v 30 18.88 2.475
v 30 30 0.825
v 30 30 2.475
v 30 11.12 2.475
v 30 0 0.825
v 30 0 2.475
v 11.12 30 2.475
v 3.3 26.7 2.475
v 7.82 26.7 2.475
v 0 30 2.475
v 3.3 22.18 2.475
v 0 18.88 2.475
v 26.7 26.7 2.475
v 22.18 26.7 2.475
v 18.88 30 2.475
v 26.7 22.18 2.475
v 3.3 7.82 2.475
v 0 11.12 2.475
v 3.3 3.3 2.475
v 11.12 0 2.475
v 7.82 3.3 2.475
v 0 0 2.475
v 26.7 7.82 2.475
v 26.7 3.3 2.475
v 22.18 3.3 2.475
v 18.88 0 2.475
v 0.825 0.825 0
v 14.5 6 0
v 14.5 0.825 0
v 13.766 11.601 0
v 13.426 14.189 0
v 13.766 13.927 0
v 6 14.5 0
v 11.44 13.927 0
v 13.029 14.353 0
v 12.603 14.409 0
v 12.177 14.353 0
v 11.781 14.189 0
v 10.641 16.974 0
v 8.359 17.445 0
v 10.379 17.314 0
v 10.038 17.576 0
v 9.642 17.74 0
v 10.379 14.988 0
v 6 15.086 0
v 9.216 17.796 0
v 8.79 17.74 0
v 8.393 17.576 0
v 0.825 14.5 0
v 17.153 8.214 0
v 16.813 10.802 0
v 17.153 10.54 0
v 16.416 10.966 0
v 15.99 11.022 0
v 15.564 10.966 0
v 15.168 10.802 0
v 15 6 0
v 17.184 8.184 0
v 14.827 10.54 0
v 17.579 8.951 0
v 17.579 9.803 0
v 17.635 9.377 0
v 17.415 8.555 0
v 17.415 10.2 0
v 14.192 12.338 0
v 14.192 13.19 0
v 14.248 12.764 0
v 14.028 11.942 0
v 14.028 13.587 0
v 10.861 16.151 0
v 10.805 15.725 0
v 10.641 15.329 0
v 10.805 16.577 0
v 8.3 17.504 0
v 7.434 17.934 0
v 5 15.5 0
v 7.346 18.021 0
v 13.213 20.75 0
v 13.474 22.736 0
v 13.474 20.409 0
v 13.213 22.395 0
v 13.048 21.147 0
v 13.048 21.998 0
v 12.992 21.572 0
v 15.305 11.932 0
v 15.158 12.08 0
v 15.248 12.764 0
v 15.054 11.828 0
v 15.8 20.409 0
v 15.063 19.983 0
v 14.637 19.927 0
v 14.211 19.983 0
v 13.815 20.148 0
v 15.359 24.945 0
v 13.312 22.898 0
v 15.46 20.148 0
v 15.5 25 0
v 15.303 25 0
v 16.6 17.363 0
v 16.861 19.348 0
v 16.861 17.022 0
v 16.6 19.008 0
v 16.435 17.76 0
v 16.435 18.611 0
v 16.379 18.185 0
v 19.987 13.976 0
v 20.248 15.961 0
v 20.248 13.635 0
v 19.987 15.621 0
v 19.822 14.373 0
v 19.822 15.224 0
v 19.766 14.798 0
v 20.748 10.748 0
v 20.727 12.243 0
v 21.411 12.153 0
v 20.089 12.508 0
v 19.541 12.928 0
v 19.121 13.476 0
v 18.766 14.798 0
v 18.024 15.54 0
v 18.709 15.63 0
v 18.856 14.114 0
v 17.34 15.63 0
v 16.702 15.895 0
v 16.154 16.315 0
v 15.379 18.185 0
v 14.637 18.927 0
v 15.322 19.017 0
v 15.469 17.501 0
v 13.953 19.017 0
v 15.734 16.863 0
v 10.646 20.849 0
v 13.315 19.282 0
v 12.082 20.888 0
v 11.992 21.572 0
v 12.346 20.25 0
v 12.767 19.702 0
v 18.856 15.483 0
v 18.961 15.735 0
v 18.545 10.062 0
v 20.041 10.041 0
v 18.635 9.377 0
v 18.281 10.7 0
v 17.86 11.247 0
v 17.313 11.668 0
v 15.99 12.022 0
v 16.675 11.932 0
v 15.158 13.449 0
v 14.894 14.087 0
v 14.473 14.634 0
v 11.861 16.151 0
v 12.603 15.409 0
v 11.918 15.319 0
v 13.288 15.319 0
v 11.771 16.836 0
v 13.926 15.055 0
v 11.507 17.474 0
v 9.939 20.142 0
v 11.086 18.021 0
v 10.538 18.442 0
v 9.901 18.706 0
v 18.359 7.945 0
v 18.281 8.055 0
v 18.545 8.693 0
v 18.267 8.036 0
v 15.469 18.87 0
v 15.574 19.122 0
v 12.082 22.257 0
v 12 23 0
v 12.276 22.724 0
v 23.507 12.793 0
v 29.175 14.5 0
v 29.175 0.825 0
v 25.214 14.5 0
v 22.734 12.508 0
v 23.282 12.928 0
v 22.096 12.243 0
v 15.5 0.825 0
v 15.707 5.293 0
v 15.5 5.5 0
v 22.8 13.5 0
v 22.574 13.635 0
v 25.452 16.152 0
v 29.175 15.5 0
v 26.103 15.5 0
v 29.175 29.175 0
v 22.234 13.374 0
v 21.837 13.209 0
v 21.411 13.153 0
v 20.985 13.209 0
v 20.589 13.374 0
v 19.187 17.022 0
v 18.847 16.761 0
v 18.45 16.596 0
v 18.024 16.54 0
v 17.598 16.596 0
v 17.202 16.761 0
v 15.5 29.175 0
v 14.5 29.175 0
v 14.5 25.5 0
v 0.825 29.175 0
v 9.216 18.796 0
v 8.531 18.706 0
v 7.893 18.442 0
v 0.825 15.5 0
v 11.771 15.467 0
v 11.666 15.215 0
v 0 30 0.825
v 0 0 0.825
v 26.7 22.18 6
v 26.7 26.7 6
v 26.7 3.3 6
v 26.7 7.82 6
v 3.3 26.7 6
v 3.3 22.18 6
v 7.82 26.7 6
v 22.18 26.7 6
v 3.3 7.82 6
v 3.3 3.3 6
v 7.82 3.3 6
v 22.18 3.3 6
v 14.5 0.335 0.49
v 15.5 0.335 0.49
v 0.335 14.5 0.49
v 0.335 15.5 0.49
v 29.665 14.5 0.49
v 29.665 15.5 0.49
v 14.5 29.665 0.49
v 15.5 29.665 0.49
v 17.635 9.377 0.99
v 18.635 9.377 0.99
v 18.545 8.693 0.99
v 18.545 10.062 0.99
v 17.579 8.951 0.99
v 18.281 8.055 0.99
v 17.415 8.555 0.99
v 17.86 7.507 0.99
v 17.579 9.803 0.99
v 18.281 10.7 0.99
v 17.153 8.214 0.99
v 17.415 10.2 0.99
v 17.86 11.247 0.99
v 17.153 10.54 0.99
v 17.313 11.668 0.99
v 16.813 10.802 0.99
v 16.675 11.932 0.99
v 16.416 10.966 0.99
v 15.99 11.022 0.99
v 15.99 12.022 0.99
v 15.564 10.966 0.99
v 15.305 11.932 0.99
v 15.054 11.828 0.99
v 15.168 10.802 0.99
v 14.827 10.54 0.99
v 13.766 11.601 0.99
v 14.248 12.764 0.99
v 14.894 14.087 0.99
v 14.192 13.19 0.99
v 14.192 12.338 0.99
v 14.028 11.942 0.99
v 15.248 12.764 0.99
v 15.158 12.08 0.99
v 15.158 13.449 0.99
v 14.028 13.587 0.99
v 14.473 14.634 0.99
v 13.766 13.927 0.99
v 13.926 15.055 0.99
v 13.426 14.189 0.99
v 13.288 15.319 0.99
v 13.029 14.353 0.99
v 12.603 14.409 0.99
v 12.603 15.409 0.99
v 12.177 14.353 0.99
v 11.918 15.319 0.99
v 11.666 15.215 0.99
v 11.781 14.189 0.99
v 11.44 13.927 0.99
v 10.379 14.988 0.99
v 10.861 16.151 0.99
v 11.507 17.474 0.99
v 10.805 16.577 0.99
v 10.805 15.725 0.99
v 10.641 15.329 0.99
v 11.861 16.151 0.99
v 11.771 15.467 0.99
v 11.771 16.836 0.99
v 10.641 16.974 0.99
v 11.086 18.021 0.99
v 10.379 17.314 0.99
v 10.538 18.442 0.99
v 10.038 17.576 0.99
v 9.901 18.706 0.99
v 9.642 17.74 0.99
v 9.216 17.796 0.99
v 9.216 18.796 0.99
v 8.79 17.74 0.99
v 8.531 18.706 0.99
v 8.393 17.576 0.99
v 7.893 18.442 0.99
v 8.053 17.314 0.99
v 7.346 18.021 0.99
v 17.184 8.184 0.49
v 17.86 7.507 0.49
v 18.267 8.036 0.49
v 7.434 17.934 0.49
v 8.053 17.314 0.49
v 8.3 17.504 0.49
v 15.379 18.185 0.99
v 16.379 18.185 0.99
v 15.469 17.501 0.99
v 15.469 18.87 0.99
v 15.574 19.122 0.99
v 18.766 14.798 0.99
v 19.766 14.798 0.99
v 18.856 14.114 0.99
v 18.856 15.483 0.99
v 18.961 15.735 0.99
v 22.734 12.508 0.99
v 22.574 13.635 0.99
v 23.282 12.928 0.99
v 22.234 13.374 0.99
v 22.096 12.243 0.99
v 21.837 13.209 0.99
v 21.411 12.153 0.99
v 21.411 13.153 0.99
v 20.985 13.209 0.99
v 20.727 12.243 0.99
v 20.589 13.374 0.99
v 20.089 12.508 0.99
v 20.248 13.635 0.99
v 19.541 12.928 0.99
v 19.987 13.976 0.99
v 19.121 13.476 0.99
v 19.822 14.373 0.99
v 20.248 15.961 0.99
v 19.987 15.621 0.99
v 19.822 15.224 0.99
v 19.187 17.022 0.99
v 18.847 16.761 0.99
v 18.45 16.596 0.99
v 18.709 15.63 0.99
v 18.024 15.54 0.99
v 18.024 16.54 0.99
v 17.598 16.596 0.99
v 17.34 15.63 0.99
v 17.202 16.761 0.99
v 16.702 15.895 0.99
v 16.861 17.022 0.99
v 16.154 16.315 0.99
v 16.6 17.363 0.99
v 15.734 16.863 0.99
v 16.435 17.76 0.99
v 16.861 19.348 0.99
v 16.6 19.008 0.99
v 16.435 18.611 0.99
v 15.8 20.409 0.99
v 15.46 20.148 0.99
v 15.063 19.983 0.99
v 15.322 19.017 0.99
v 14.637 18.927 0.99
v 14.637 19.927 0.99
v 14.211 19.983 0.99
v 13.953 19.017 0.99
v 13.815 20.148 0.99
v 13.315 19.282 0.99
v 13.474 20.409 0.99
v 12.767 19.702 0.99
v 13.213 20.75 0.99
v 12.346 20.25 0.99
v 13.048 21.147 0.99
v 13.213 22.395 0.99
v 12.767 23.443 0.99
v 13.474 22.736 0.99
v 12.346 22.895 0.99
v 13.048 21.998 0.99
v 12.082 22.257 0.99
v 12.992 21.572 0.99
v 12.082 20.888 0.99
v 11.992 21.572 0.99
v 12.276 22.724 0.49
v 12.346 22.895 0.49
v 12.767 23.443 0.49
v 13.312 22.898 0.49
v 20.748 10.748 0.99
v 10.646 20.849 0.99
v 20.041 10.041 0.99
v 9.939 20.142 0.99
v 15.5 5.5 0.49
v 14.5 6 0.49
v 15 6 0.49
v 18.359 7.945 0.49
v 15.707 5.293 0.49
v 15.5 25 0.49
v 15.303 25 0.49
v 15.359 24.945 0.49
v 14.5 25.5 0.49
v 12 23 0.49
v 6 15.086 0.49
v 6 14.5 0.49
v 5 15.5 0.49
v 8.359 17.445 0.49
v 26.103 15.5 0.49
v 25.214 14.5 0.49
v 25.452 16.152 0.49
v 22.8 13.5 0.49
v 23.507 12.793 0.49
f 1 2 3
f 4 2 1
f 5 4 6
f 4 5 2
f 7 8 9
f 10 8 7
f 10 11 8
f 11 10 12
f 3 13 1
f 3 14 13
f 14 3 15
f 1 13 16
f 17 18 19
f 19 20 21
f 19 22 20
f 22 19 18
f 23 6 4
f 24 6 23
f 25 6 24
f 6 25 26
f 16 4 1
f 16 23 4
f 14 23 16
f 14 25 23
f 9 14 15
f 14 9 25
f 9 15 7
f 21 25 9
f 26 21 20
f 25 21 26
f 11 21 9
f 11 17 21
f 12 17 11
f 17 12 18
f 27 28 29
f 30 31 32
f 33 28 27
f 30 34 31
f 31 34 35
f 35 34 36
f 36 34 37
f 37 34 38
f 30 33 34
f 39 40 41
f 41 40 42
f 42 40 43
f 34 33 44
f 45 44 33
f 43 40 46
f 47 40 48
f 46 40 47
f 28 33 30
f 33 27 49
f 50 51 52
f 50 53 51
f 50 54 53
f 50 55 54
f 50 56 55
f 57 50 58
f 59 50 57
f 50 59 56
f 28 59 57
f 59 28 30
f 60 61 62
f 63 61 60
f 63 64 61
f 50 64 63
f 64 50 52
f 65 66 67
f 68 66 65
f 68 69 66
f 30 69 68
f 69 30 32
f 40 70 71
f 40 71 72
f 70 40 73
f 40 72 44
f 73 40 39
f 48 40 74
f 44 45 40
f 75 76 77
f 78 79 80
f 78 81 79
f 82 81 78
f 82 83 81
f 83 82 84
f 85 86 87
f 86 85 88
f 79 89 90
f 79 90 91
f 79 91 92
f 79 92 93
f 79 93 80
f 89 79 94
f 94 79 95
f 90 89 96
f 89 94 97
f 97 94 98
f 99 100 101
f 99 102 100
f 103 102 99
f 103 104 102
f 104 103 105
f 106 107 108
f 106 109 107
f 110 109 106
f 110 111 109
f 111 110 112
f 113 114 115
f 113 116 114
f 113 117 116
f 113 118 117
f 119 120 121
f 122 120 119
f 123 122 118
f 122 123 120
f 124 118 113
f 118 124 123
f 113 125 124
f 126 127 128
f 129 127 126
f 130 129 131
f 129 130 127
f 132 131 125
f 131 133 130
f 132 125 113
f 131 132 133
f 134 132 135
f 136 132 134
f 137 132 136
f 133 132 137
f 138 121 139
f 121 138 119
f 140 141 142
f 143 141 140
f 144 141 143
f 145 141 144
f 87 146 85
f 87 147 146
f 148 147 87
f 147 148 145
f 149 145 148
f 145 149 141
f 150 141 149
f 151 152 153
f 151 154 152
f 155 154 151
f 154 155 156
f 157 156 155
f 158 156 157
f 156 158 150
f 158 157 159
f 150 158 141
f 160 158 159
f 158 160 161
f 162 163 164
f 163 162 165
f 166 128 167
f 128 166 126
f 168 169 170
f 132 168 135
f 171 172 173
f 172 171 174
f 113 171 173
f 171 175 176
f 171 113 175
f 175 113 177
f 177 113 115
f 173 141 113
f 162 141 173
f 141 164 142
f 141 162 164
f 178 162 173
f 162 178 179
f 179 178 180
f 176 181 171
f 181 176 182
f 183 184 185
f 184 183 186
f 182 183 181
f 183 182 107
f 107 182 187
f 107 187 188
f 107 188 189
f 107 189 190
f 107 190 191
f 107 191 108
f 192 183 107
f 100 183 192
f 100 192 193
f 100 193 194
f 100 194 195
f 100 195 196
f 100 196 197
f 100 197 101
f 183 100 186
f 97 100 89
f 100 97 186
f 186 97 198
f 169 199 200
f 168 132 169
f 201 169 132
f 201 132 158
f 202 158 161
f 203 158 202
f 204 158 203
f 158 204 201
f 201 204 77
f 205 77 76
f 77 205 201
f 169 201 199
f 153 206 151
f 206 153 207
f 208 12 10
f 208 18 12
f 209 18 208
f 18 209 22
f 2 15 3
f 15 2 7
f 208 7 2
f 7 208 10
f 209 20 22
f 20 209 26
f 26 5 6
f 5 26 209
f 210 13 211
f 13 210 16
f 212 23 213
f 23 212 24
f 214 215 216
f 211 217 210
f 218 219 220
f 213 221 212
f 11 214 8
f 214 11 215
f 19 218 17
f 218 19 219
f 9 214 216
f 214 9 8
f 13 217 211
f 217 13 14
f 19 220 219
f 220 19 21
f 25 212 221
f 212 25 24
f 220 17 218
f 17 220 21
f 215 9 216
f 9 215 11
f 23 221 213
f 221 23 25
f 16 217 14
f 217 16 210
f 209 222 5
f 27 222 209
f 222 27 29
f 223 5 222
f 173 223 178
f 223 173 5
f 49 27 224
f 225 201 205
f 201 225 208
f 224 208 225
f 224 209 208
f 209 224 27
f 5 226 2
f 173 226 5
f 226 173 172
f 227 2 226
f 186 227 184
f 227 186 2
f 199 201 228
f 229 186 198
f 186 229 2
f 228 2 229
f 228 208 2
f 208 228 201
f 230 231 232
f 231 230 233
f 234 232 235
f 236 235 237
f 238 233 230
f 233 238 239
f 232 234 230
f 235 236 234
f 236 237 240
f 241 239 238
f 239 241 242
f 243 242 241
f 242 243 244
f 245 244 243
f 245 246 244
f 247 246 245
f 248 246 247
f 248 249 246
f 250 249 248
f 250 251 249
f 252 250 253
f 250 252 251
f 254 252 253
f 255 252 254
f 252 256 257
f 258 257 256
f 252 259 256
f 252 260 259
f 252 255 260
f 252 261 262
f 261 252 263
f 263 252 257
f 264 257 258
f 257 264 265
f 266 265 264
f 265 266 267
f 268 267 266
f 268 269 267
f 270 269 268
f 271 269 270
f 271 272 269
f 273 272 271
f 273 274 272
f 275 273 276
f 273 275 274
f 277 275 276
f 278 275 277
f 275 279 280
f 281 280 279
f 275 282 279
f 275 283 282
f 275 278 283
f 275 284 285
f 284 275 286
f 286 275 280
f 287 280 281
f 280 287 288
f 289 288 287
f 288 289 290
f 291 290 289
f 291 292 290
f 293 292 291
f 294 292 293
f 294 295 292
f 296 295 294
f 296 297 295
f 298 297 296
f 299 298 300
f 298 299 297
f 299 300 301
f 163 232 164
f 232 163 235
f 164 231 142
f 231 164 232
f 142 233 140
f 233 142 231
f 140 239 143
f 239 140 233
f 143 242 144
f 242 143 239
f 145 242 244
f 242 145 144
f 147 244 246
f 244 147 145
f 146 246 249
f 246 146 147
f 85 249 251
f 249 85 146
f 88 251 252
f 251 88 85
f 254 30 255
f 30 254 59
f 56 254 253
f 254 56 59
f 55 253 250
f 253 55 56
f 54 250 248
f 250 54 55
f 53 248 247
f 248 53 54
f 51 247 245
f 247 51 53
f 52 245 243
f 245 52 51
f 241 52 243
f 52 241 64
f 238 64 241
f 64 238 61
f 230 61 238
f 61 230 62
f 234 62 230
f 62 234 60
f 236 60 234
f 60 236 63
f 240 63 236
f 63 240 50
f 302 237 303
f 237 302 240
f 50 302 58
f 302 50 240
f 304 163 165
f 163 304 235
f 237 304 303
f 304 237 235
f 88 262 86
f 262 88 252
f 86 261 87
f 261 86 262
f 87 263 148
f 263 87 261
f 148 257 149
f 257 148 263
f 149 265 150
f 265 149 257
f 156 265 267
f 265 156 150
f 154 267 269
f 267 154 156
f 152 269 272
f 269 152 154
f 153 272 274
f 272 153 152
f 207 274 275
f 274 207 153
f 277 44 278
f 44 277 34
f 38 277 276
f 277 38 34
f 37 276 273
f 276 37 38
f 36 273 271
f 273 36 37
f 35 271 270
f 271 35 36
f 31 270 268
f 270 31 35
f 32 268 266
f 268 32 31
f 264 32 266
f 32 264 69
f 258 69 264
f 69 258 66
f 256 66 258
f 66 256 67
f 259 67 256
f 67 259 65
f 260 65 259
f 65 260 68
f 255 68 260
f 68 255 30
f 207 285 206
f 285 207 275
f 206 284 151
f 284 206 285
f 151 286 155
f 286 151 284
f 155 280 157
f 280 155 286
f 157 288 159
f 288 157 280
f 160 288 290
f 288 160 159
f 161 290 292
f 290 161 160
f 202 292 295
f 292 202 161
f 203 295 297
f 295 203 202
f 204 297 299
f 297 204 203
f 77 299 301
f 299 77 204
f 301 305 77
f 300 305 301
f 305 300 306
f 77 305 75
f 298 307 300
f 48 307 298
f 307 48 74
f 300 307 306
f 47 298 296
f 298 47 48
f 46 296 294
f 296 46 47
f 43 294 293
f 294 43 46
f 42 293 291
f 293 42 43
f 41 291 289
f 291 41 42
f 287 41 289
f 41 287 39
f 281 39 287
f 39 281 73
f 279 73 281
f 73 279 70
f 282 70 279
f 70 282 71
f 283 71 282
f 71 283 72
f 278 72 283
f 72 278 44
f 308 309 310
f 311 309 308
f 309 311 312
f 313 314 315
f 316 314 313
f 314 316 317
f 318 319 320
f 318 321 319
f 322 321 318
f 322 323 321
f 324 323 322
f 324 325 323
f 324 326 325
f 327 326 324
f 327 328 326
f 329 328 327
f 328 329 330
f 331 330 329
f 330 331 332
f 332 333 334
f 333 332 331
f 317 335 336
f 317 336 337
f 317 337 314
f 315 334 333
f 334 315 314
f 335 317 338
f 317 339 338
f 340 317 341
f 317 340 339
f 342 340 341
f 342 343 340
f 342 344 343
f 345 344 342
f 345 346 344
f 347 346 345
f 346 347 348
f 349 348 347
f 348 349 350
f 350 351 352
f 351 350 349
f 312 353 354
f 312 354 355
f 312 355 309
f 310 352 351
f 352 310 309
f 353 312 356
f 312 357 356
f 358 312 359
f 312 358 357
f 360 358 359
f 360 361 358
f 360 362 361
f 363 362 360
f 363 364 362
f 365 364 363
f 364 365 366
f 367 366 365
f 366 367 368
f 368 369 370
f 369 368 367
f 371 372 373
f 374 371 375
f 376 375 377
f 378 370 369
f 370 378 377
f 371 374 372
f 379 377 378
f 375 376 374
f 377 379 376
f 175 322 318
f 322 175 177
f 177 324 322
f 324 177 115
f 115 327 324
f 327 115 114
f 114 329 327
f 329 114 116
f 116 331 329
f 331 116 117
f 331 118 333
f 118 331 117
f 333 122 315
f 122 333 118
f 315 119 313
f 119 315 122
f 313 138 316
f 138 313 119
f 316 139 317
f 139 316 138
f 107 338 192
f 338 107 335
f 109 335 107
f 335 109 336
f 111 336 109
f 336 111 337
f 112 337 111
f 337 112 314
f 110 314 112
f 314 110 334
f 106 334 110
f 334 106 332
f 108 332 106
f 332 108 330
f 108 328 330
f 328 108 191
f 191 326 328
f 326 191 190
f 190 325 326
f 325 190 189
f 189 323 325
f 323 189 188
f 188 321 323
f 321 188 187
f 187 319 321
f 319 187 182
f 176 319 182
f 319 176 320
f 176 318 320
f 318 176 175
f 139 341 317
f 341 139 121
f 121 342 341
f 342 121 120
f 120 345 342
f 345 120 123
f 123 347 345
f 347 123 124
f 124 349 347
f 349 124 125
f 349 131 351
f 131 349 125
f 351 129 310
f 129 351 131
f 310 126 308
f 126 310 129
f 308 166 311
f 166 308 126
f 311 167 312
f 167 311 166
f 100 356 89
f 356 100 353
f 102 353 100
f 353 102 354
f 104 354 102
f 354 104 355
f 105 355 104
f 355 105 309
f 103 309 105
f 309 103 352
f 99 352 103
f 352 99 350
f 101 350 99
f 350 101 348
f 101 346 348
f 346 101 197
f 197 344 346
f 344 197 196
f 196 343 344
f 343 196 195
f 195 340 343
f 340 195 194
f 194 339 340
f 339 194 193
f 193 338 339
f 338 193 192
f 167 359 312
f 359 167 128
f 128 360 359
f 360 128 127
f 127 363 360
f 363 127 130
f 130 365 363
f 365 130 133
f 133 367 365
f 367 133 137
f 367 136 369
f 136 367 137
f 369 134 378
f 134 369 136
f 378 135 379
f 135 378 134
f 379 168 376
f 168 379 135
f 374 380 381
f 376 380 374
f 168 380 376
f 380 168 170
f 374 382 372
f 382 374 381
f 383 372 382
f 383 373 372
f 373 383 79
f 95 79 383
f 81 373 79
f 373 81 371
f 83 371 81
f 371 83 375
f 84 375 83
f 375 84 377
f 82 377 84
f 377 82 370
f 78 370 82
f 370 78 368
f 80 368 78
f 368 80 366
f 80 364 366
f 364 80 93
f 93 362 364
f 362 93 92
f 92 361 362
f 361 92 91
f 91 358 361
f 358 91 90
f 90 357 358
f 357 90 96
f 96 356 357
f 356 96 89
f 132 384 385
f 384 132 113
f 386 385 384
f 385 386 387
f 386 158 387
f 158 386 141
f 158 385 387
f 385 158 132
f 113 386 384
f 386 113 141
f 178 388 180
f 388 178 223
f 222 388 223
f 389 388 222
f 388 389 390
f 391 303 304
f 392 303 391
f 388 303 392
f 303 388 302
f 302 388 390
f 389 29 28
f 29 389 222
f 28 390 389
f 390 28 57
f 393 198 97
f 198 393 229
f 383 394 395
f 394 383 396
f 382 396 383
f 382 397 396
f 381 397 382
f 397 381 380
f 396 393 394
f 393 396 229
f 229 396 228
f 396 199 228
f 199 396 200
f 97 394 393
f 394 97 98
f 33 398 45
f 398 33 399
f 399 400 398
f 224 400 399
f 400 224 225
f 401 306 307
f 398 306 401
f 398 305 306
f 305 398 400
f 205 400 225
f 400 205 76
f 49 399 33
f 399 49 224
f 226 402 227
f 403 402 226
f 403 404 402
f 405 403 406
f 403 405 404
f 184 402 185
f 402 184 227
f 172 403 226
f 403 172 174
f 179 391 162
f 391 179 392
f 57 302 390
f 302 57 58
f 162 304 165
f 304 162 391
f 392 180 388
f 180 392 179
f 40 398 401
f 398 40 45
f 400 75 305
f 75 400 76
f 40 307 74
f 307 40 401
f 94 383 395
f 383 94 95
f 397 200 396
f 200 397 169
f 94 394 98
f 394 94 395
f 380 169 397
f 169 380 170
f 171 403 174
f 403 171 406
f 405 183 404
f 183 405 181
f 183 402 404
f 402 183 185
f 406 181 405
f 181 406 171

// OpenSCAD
// file: sym_inductor.scad
module sector(radius, angles, fn = 24) {
    r = radius / cos(180 / fn);
    step = -360 / fn;

    points = concat([[0, 0]],
        [for(a = [angles[0] : step : angles[1] - 360]) 
            [r * cos(a), r * sin(a)]
        ],
        [[r * cos(angles[1]), r * sin(angles[1])]]
    );

    difference() {
        circle(radius, $fn = fn);
        polygon(points);
    }
}

module arc(radius, angles, width, fn = 24) {
    difference() {
        sector(radius + width/2, angles, fn);
        sector(radius - width/2, angles, fn);
    }
} 

module arc_3d(radius, angles, width, depth, fn)
{
    linear_extrude(depth) arc(radius, angles, width);
}

module sym_inductor(height, depth, thickness)
{
    n1 = 3.33;
    //translate([0,-thickness/2,0]) cube([height/6, 2*thickness, depth]);
    r1 = height/(2*n1);
    
    translate([height/6,r1+thickness/2,0]) arc_3d(r1, [-90, 90], 2*thickness, depth, 120);
    
    translate([height/6,3*r1+1.5*thickness,0]) arc_3d(r1, [-90, 90], 2*thickness, depth, 120);

    translate([height/6,5*r1+2.5*thickness,0]) arc_3d(r1, [-90, 90], 2*thickness, depth, 120);

    //translate([0,height-1.5*thickness,0]) cube([height/6, 2*thickness, depth]);
}

sym_inductor(30, 0.5, 1);
// file: settings.scad
cube_width=30;
cube_height=16;
cube_thickness=3.3;

cap_width=30;
cap_height=6;
cap_thickness=3.3;

glyph_depth=0.5;
glyph_thickness=1;
// file: sym_transformer_1_1.scad
use <sym_inductor.scad>
include <settings.scad>

module transformer_1_1(height, depth, thickness)
{
    sym_inductor(height, depth, thickness);
    translate([height/2.5,0,0]) cube([2*thickness, height, depth]);
    translate([0.87*height,0,0])mirror([1,0,0])sym_inductor(height, depth, thickness);
}

//sym_inductor(30, 0.5, 1);
transformer_1_1(30, 0.5, 1);
// file: cap_1x1.scad
include <settings.scad>

module cap_1x1(width, height, thickness)
{
    width1=width-thickness;
    difference()
    {
        union()
        {
            cube([width, width, thickness*3/4]);
            translate([thickness,thickness,0])cube([width-2*thickness, width-2*thickness, height]);
        }
        union()
        {
            translate([width/2,width/2,0])rotate([0,0,45])translate([-width1/2,-width1/2,thickness*3/4]) cube([width1,width1,height]);
                        //corners
            translate([0,0.25*thickness,0])rotate([45,0,0]) translate([-0.5*width, -width, -0.5*height]) cube([2*width, width, 2*height]);
            translate([0.25*thickness,0,0]) rotate([0,-45,0]) translate([-width, -0.5*width, -0.5*height]) cube([width, 2*width, 2*height]);
            translate([width-0.25*thickness,0,0]) rotate([0,45,0]) translate([0, 0, -0.5*height]) cube([width, 2*width, 2*height]);
            translate([0,width-0.25*thickness,0]) rotate([-45,0,0]) translate([-0.5*width, 0, -0.5*height]) cube([2*width, width, 2*height]);
        }
    }
}

cap_1x1(cap_width, cap_height, cap_thickness);
//ring(10,1,1);
//arrow(1, 20, 3, 1);
//transistor_npn(30, 1, 1);
// main file
use <cap_1x1.scad>
use <sym_transformer_1_1.scad>
include <settings.scad>

module cap_1x1_transformer(width, height, thickness)
{
    difference()
    {
        cap_1x1(width, height, thickness);
        union()
        {
            translate([width/2+glyph_thickness, width/5, -0.01]) rotate([0,0,45])transformer_1_1(width/2.1, glyph_thickness, glyph_depth);
            translate([width/2-glyph_thickness/2, 0, -0.01]) cube([glyph_thickness, width/5, glyph_depth]);
            translate([width/2-glyph_thickness/2, 4*width/5+glyph_thickness, -0.01]) cube([glyph_thickness, width/5, glyph_depth]);
            translate([0, width/2-glyph_thickness/2, -0.01]) cube([width/5, glyph_thickness, glyph_depth]);
            translate([4*width/5+glyph_thickness, width/2-glyph_thickness/2, -0.01]) cube([width/5, glyph_thickness, glyph_depth]);
            
            translate([width/2,width/5,-0.01])rotate([0,0,-45])cube([glyph_thickness, width/8, glyph_depth]);
            translate([width/5-1,width/2+0.5,-0.01])rotate([0,0,-45])cube([glyph_thickness, width/8, glyph_depth]);
            translate([width/2-3,4*width/5-1,-0.01])rotate([0,0,-45])cube([glyph_thickness, width/8, glyph_depth]);
            translate([3.8*width/5,0.9*width/2,-0.01])rotate([0,0,-45])cube([glyph_thickness, width/8, glyph_depth]);
        }
    }
}

cap_1x1_transformer(cap_width, cap_height, cap_thickness);
